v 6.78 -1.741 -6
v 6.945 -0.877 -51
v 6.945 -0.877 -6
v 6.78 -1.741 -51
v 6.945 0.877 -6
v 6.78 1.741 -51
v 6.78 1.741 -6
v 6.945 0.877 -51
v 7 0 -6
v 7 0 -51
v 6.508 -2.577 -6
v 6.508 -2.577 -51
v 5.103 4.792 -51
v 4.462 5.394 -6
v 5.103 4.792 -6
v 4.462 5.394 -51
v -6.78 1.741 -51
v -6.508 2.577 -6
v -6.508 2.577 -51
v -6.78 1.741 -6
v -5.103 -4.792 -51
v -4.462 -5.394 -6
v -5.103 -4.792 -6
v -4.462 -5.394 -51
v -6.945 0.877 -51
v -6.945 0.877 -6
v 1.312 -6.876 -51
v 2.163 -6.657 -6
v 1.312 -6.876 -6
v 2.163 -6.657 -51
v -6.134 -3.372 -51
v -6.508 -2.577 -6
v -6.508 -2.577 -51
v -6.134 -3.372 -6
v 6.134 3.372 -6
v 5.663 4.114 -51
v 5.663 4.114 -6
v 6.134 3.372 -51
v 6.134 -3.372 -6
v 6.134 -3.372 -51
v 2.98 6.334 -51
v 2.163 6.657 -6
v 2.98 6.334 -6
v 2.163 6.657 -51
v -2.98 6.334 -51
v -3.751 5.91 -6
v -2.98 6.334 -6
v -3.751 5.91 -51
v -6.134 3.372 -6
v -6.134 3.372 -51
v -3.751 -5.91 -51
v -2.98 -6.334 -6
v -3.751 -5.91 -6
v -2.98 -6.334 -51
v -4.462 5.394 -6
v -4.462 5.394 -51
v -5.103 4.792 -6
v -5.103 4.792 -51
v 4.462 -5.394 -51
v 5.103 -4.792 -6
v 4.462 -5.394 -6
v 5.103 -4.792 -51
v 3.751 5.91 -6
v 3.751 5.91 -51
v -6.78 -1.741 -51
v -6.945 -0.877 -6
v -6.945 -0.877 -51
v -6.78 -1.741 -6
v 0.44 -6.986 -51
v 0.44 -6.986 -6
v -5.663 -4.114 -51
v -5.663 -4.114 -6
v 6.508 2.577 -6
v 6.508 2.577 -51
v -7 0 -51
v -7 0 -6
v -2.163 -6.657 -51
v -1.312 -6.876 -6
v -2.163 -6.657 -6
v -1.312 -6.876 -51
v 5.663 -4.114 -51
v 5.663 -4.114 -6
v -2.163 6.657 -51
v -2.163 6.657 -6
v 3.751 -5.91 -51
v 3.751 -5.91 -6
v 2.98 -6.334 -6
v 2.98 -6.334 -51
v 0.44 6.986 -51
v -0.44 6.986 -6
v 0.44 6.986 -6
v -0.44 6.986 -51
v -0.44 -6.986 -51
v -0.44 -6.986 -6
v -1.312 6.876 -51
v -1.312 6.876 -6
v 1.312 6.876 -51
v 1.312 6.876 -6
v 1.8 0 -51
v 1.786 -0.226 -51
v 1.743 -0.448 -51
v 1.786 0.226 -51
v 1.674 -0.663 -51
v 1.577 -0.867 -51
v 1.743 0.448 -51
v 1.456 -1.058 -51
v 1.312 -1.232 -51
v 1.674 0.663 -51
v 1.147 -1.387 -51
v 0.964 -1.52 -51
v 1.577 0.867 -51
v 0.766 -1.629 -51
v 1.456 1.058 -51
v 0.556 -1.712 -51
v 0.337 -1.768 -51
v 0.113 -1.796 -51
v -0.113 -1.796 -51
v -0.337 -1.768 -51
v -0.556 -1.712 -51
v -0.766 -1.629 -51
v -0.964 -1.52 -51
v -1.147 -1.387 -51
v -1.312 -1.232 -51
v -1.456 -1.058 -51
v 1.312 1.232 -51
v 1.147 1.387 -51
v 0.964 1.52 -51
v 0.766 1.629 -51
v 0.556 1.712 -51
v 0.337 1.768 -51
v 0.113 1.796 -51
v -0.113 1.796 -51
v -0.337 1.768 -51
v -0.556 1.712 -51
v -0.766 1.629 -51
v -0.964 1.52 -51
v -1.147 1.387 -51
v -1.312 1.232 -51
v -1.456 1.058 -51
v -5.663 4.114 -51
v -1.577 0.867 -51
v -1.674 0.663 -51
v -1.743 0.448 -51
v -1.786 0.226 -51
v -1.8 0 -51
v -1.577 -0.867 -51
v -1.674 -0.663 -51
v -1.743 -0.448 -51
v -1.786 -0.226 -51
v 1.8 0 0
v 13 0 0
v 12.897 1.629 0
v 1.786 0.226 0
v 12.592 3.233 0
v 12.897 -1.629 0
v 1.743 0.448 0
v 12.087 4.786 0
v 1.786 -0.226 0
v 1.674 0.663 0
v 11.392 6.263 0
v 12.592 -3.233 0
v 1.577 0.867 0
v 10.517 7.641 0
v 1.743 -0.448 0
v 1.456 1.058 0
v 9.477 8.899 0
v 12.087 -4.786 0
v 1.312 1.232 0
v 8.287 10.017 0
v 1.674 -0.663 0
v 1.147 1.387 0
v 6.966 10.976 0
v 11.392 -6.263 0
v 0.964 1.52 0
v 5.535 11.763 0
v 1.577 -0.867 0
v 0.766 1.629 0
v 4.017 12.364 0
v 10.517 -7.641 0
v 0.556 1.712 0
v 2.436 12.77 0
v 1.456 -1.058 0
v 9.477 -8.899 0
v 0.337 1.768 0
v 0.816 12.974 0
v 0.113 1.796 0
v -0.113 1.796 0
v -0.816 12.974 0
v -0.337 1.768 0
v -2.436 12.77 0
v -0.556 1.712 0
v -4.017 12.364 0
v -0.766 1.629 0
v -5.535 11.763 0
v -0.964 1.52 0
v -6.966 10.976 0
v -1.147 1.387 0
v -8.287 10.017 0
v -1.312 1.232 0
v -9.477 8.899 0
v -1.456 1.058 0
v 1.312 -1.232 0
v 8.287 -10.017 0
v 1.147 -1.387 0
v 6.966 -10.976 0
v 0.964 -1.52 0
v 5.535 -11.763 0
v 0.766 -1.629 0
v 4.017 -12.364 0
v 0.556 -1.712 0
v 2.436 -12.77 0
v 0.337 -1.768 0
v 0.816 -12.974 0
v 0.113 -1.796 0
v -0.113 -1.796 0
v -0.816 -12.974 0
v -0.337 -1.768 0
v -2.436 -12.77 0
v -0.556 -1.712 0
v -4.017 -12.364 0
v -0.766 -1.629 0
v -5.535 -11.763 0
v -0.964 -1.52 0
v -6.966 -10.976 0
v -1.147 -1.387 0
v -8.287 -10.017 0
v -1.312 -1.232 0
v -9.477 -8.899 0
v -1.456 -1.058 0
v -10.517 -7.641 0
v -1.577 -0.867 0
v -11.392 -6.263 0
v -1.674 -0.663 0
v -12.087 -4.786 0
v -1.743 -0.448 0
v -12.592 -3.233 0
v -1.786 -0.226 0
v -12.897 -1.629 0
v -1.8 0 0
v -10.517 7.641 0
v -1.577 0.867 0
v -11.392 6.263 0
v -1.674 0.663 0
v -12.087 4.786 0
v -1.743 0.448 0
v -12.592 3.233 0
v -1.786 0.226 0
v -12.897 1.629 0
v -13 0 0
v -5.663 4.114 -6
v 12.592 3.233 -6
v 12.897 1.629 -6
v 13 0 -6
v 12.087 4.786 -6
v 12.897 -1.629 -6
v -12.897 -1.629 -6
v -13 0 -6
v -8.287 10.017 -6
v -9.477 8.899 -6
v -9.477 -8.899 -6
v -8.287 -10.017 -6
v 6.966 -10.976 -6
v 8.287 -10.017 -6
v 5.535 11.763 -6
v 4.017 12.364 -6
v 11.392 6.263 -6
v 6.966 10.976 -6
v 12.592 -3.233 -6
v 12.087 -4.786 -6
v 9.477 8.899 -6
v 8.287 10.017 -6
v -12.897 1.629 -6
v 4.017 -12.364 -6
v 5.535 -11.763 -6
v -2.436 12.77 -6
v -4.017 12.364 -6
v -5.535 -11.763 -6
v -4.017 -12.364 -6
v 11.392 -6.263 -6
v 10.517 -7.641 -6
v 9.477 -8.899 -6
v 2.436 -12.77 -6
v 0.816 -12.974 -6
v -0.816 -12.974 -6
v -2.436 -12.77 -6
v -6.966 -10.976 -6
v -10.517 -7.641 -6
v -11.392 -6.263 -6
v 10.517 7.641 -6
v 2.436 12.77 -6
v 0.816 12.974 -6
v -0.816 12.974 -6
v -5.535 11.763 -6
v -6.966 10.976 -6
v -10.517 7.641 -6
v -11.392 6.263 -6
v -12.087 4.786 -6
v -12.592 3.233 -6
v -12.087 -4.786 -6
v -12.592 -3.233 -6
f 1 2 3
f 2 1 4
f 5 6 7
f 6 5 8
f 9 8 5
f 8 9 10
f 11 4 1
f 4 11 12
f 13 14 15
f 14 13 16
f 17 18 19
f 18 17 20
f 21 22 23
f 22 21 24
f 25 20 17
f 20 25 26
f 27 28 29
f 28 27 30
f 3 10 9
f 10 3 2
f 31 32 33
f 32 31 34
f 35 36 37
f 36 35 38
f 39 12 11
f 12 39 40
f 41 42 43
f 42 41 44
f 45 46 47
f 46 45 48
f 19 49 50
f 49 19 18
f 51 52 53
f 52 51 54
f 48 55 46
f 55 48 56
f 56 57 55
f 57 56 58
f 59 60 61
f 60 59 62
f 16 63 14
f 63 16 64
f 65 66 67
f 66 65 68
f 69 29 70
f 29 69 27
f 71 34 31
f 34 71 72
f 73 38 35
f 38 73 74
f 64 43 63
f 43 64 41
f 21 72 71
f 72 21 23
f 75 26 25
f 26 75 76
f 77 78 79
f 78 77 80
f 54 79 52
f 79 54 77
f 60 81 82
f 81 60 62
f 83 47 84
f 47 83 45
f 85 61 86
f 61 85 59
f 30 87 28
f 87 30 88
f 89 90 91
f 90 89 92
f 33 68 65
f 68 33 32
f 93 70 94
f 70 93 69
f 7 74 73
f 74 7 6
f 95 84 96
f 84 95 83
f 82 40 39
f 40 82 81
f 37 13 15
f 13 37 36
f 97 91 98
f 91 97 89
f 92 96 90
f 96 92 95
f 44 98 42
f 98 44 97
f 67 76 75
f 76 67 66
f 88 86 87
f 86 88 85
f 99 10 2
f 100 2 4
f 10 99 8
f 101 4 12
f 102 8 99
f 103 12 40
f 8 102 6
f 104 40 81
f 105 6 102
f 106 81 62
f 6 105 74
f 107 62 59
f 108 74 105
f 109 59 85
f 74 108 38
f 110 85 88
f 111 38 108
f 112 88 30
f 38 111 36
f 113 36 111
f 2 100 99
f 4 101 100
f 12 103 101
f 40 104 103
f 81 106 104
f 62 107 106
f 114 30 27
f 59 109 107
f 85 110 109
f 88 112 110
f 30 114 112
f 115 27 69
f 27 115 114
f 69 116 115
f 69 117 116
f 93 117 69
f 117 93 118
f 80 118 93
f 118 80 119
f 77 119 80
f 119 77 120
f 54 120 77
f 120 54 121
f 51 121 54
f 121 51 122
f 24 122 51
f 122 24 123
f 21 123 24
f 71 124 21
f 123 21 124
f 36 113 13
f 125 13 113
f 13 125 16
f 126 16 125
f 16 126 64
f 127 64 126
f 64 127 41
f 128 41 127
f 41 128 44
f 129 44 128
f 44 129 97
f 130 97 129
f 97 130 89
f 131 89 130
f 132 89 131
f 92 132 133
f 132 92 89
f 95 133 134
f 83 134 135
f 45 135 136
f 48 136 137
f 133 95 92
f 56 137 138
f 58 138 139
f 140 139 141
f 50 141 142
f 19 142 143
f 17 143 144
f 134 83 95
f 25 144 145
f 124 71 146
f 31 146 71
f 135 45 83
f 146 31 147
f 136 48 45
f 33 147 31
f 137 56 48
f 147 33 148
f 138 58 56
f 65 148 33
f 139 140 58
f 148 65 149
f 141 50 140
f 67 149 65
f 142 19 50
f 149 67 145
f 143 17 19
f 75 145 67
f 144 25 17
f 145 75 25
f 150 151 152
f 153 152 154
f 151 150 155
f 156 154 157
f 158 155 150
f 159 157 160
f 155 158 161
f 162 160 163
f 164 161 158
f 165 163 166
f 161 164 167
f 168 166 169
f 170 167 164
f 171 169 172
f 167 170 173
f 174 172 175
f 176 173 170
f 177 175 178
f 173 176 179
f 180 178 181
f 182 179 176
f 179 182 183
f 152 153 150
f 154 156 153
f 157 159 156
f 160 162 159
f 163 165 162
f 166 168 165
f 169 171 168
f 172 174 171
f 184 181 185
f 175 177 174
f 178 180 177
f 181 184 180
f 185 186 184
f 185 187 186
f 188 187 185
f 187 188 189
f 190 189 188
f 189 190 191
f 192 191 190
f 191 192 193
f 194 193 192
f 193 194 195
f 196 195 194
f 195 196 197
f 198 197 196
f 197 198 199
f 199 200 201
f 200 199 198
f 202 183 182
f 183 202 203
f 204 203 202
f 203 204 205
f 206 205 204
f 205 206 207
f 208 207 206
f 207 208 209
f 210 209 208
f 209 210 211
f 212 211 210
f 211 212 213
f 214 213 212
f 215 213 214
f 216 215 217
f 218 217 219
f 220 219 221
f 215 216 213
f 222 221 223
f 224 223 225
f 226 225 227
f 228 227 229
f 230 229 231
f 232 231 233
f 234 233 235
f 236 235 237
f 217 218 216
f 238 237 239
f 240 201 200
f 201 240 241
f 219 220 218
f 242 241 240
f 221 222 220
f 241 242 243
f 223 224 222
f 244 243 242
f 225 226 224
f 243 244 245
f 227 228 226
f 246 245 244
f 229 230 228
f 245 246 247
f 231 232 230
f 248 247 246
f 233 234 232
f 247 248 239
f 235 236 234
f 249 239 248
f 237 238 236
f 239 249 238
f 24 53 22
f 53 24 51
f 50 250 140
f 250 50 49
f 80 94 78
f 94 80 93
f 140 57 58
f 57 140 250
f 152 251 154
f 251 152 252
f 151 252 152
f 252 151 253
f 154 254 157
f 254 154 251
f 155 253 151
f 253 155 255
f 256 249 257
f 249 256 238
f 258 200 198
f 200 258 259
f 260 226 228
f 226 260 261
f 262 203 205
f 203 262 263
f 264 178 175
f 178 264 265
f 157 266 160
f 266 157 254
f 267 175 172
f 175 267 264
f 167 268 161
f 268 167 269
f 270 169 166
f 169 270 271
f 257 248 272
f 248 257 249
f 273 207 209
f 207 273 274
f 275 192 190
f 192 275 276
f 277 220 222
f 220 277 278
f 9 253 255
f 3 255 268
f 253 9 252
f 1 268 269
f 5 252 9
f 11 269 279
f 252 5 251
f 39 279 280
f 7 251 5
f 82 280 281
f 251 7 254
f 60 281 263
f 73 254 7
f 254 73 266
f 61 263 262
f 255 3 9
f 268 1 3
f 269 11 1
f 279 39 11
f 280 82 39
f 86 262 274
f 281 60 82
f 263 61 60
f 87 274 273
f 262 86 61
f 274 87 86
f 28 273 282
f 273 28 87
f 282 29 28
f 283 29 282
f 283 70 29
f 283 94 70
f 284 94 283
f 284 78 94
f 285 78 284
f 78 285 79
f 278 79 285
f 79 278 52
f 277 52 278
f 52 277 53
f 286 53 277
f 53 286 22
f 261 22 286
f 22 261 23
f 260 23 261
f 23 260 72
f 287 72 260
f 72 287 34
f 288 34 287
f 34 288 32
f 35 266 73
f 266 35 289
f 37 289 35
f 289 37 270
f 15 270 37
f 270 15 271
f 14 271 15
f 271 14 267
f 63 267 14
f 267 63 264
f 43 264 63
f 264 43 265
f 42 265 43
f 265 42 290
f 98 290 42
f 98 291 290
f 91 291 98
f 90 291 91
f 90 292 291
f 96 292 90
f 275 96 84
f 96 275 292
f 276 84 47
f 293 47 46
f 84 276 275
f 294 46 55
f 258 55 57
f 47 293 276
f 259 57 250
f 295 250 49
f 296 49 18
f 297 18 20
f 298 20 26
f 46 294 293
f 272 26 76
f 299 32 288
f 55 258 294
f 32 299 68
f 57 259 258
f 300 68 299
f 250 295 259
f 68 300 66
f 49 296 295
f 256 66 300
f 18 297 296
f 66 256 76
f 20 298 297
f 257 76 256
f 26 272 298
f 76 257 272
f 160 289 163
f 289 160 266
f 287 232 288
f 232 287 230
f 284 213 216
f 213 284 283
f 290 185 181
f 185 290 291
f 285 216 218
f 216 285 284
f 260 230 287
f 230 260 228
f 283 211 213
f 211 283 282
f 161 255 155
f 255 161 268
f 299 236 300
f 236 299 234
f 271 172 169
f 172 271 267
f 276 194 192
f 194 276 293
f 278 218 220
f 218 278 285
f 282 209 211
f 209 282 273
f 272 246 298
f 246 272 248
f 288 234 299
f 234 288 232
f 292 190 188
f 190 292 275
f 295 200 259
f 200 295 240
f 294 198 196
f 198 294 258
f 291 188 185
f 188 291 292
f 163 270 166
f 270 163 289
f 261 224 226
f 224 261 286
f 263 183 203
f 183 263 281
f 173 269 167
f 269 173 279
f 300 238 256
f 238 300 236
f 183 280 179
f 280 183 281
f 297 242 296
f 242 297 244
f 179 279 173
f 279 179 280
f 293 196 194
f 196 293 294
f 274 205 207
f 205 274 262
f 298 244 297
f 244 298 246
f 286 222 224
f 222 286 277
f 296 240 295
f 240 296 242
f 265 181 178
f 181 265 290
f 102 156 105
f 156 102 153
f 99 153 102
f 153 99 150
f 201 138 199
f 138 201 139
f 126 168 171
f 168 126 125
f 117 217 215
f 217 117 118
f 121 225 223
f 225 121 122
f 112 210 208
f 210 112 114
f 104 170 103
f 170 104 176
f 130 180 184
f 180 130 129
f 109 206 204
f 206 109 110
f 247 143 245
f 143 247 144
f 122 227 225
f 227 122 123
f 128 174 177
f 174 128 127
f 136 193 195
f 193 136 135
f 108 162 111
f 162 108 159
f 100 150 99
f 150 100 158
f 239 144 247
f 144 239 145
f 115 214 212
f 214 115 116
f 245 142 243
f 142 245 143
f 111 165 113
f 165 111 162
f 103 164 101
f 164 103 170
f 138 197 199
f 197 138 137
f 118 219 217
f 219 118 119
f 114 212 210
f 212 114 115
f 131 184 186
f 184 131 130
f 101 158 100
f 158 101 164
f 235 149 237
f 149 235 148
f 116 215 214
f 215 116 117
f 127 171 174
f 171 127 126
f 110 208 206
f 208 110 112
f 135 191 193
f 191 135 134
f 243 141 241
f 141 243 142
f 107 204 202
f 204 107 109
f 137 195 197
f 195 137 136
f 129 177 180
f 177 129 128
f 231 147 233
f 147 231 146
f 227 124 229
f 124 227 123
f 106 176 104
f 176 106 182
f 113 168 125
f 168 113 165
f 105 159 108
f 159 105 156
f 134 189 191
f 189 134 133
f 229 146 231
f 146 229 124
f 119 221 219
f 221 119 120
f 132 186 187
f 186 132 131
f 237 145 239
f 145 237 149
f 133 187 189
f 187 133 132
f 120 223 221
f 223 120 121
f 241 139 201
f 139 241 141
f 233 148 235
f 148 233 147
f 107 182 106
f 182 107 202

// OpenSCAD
$fn = 50;


difference() {
	union() {
		translate(v = [0, 0, -51.0000000000]) {
			cylinder(h = 51, r = 7.0000000000);
		}
		translate(v = [0, 0, -6.0000000000]) {
			cylinder(h = 6, r = 13.0000000000);
		}
	}
	union() {
		#translate(v = [0, 0, -51]) {
			cylinder(h = 51, r = 1.8000000000);
		}
	}
}
